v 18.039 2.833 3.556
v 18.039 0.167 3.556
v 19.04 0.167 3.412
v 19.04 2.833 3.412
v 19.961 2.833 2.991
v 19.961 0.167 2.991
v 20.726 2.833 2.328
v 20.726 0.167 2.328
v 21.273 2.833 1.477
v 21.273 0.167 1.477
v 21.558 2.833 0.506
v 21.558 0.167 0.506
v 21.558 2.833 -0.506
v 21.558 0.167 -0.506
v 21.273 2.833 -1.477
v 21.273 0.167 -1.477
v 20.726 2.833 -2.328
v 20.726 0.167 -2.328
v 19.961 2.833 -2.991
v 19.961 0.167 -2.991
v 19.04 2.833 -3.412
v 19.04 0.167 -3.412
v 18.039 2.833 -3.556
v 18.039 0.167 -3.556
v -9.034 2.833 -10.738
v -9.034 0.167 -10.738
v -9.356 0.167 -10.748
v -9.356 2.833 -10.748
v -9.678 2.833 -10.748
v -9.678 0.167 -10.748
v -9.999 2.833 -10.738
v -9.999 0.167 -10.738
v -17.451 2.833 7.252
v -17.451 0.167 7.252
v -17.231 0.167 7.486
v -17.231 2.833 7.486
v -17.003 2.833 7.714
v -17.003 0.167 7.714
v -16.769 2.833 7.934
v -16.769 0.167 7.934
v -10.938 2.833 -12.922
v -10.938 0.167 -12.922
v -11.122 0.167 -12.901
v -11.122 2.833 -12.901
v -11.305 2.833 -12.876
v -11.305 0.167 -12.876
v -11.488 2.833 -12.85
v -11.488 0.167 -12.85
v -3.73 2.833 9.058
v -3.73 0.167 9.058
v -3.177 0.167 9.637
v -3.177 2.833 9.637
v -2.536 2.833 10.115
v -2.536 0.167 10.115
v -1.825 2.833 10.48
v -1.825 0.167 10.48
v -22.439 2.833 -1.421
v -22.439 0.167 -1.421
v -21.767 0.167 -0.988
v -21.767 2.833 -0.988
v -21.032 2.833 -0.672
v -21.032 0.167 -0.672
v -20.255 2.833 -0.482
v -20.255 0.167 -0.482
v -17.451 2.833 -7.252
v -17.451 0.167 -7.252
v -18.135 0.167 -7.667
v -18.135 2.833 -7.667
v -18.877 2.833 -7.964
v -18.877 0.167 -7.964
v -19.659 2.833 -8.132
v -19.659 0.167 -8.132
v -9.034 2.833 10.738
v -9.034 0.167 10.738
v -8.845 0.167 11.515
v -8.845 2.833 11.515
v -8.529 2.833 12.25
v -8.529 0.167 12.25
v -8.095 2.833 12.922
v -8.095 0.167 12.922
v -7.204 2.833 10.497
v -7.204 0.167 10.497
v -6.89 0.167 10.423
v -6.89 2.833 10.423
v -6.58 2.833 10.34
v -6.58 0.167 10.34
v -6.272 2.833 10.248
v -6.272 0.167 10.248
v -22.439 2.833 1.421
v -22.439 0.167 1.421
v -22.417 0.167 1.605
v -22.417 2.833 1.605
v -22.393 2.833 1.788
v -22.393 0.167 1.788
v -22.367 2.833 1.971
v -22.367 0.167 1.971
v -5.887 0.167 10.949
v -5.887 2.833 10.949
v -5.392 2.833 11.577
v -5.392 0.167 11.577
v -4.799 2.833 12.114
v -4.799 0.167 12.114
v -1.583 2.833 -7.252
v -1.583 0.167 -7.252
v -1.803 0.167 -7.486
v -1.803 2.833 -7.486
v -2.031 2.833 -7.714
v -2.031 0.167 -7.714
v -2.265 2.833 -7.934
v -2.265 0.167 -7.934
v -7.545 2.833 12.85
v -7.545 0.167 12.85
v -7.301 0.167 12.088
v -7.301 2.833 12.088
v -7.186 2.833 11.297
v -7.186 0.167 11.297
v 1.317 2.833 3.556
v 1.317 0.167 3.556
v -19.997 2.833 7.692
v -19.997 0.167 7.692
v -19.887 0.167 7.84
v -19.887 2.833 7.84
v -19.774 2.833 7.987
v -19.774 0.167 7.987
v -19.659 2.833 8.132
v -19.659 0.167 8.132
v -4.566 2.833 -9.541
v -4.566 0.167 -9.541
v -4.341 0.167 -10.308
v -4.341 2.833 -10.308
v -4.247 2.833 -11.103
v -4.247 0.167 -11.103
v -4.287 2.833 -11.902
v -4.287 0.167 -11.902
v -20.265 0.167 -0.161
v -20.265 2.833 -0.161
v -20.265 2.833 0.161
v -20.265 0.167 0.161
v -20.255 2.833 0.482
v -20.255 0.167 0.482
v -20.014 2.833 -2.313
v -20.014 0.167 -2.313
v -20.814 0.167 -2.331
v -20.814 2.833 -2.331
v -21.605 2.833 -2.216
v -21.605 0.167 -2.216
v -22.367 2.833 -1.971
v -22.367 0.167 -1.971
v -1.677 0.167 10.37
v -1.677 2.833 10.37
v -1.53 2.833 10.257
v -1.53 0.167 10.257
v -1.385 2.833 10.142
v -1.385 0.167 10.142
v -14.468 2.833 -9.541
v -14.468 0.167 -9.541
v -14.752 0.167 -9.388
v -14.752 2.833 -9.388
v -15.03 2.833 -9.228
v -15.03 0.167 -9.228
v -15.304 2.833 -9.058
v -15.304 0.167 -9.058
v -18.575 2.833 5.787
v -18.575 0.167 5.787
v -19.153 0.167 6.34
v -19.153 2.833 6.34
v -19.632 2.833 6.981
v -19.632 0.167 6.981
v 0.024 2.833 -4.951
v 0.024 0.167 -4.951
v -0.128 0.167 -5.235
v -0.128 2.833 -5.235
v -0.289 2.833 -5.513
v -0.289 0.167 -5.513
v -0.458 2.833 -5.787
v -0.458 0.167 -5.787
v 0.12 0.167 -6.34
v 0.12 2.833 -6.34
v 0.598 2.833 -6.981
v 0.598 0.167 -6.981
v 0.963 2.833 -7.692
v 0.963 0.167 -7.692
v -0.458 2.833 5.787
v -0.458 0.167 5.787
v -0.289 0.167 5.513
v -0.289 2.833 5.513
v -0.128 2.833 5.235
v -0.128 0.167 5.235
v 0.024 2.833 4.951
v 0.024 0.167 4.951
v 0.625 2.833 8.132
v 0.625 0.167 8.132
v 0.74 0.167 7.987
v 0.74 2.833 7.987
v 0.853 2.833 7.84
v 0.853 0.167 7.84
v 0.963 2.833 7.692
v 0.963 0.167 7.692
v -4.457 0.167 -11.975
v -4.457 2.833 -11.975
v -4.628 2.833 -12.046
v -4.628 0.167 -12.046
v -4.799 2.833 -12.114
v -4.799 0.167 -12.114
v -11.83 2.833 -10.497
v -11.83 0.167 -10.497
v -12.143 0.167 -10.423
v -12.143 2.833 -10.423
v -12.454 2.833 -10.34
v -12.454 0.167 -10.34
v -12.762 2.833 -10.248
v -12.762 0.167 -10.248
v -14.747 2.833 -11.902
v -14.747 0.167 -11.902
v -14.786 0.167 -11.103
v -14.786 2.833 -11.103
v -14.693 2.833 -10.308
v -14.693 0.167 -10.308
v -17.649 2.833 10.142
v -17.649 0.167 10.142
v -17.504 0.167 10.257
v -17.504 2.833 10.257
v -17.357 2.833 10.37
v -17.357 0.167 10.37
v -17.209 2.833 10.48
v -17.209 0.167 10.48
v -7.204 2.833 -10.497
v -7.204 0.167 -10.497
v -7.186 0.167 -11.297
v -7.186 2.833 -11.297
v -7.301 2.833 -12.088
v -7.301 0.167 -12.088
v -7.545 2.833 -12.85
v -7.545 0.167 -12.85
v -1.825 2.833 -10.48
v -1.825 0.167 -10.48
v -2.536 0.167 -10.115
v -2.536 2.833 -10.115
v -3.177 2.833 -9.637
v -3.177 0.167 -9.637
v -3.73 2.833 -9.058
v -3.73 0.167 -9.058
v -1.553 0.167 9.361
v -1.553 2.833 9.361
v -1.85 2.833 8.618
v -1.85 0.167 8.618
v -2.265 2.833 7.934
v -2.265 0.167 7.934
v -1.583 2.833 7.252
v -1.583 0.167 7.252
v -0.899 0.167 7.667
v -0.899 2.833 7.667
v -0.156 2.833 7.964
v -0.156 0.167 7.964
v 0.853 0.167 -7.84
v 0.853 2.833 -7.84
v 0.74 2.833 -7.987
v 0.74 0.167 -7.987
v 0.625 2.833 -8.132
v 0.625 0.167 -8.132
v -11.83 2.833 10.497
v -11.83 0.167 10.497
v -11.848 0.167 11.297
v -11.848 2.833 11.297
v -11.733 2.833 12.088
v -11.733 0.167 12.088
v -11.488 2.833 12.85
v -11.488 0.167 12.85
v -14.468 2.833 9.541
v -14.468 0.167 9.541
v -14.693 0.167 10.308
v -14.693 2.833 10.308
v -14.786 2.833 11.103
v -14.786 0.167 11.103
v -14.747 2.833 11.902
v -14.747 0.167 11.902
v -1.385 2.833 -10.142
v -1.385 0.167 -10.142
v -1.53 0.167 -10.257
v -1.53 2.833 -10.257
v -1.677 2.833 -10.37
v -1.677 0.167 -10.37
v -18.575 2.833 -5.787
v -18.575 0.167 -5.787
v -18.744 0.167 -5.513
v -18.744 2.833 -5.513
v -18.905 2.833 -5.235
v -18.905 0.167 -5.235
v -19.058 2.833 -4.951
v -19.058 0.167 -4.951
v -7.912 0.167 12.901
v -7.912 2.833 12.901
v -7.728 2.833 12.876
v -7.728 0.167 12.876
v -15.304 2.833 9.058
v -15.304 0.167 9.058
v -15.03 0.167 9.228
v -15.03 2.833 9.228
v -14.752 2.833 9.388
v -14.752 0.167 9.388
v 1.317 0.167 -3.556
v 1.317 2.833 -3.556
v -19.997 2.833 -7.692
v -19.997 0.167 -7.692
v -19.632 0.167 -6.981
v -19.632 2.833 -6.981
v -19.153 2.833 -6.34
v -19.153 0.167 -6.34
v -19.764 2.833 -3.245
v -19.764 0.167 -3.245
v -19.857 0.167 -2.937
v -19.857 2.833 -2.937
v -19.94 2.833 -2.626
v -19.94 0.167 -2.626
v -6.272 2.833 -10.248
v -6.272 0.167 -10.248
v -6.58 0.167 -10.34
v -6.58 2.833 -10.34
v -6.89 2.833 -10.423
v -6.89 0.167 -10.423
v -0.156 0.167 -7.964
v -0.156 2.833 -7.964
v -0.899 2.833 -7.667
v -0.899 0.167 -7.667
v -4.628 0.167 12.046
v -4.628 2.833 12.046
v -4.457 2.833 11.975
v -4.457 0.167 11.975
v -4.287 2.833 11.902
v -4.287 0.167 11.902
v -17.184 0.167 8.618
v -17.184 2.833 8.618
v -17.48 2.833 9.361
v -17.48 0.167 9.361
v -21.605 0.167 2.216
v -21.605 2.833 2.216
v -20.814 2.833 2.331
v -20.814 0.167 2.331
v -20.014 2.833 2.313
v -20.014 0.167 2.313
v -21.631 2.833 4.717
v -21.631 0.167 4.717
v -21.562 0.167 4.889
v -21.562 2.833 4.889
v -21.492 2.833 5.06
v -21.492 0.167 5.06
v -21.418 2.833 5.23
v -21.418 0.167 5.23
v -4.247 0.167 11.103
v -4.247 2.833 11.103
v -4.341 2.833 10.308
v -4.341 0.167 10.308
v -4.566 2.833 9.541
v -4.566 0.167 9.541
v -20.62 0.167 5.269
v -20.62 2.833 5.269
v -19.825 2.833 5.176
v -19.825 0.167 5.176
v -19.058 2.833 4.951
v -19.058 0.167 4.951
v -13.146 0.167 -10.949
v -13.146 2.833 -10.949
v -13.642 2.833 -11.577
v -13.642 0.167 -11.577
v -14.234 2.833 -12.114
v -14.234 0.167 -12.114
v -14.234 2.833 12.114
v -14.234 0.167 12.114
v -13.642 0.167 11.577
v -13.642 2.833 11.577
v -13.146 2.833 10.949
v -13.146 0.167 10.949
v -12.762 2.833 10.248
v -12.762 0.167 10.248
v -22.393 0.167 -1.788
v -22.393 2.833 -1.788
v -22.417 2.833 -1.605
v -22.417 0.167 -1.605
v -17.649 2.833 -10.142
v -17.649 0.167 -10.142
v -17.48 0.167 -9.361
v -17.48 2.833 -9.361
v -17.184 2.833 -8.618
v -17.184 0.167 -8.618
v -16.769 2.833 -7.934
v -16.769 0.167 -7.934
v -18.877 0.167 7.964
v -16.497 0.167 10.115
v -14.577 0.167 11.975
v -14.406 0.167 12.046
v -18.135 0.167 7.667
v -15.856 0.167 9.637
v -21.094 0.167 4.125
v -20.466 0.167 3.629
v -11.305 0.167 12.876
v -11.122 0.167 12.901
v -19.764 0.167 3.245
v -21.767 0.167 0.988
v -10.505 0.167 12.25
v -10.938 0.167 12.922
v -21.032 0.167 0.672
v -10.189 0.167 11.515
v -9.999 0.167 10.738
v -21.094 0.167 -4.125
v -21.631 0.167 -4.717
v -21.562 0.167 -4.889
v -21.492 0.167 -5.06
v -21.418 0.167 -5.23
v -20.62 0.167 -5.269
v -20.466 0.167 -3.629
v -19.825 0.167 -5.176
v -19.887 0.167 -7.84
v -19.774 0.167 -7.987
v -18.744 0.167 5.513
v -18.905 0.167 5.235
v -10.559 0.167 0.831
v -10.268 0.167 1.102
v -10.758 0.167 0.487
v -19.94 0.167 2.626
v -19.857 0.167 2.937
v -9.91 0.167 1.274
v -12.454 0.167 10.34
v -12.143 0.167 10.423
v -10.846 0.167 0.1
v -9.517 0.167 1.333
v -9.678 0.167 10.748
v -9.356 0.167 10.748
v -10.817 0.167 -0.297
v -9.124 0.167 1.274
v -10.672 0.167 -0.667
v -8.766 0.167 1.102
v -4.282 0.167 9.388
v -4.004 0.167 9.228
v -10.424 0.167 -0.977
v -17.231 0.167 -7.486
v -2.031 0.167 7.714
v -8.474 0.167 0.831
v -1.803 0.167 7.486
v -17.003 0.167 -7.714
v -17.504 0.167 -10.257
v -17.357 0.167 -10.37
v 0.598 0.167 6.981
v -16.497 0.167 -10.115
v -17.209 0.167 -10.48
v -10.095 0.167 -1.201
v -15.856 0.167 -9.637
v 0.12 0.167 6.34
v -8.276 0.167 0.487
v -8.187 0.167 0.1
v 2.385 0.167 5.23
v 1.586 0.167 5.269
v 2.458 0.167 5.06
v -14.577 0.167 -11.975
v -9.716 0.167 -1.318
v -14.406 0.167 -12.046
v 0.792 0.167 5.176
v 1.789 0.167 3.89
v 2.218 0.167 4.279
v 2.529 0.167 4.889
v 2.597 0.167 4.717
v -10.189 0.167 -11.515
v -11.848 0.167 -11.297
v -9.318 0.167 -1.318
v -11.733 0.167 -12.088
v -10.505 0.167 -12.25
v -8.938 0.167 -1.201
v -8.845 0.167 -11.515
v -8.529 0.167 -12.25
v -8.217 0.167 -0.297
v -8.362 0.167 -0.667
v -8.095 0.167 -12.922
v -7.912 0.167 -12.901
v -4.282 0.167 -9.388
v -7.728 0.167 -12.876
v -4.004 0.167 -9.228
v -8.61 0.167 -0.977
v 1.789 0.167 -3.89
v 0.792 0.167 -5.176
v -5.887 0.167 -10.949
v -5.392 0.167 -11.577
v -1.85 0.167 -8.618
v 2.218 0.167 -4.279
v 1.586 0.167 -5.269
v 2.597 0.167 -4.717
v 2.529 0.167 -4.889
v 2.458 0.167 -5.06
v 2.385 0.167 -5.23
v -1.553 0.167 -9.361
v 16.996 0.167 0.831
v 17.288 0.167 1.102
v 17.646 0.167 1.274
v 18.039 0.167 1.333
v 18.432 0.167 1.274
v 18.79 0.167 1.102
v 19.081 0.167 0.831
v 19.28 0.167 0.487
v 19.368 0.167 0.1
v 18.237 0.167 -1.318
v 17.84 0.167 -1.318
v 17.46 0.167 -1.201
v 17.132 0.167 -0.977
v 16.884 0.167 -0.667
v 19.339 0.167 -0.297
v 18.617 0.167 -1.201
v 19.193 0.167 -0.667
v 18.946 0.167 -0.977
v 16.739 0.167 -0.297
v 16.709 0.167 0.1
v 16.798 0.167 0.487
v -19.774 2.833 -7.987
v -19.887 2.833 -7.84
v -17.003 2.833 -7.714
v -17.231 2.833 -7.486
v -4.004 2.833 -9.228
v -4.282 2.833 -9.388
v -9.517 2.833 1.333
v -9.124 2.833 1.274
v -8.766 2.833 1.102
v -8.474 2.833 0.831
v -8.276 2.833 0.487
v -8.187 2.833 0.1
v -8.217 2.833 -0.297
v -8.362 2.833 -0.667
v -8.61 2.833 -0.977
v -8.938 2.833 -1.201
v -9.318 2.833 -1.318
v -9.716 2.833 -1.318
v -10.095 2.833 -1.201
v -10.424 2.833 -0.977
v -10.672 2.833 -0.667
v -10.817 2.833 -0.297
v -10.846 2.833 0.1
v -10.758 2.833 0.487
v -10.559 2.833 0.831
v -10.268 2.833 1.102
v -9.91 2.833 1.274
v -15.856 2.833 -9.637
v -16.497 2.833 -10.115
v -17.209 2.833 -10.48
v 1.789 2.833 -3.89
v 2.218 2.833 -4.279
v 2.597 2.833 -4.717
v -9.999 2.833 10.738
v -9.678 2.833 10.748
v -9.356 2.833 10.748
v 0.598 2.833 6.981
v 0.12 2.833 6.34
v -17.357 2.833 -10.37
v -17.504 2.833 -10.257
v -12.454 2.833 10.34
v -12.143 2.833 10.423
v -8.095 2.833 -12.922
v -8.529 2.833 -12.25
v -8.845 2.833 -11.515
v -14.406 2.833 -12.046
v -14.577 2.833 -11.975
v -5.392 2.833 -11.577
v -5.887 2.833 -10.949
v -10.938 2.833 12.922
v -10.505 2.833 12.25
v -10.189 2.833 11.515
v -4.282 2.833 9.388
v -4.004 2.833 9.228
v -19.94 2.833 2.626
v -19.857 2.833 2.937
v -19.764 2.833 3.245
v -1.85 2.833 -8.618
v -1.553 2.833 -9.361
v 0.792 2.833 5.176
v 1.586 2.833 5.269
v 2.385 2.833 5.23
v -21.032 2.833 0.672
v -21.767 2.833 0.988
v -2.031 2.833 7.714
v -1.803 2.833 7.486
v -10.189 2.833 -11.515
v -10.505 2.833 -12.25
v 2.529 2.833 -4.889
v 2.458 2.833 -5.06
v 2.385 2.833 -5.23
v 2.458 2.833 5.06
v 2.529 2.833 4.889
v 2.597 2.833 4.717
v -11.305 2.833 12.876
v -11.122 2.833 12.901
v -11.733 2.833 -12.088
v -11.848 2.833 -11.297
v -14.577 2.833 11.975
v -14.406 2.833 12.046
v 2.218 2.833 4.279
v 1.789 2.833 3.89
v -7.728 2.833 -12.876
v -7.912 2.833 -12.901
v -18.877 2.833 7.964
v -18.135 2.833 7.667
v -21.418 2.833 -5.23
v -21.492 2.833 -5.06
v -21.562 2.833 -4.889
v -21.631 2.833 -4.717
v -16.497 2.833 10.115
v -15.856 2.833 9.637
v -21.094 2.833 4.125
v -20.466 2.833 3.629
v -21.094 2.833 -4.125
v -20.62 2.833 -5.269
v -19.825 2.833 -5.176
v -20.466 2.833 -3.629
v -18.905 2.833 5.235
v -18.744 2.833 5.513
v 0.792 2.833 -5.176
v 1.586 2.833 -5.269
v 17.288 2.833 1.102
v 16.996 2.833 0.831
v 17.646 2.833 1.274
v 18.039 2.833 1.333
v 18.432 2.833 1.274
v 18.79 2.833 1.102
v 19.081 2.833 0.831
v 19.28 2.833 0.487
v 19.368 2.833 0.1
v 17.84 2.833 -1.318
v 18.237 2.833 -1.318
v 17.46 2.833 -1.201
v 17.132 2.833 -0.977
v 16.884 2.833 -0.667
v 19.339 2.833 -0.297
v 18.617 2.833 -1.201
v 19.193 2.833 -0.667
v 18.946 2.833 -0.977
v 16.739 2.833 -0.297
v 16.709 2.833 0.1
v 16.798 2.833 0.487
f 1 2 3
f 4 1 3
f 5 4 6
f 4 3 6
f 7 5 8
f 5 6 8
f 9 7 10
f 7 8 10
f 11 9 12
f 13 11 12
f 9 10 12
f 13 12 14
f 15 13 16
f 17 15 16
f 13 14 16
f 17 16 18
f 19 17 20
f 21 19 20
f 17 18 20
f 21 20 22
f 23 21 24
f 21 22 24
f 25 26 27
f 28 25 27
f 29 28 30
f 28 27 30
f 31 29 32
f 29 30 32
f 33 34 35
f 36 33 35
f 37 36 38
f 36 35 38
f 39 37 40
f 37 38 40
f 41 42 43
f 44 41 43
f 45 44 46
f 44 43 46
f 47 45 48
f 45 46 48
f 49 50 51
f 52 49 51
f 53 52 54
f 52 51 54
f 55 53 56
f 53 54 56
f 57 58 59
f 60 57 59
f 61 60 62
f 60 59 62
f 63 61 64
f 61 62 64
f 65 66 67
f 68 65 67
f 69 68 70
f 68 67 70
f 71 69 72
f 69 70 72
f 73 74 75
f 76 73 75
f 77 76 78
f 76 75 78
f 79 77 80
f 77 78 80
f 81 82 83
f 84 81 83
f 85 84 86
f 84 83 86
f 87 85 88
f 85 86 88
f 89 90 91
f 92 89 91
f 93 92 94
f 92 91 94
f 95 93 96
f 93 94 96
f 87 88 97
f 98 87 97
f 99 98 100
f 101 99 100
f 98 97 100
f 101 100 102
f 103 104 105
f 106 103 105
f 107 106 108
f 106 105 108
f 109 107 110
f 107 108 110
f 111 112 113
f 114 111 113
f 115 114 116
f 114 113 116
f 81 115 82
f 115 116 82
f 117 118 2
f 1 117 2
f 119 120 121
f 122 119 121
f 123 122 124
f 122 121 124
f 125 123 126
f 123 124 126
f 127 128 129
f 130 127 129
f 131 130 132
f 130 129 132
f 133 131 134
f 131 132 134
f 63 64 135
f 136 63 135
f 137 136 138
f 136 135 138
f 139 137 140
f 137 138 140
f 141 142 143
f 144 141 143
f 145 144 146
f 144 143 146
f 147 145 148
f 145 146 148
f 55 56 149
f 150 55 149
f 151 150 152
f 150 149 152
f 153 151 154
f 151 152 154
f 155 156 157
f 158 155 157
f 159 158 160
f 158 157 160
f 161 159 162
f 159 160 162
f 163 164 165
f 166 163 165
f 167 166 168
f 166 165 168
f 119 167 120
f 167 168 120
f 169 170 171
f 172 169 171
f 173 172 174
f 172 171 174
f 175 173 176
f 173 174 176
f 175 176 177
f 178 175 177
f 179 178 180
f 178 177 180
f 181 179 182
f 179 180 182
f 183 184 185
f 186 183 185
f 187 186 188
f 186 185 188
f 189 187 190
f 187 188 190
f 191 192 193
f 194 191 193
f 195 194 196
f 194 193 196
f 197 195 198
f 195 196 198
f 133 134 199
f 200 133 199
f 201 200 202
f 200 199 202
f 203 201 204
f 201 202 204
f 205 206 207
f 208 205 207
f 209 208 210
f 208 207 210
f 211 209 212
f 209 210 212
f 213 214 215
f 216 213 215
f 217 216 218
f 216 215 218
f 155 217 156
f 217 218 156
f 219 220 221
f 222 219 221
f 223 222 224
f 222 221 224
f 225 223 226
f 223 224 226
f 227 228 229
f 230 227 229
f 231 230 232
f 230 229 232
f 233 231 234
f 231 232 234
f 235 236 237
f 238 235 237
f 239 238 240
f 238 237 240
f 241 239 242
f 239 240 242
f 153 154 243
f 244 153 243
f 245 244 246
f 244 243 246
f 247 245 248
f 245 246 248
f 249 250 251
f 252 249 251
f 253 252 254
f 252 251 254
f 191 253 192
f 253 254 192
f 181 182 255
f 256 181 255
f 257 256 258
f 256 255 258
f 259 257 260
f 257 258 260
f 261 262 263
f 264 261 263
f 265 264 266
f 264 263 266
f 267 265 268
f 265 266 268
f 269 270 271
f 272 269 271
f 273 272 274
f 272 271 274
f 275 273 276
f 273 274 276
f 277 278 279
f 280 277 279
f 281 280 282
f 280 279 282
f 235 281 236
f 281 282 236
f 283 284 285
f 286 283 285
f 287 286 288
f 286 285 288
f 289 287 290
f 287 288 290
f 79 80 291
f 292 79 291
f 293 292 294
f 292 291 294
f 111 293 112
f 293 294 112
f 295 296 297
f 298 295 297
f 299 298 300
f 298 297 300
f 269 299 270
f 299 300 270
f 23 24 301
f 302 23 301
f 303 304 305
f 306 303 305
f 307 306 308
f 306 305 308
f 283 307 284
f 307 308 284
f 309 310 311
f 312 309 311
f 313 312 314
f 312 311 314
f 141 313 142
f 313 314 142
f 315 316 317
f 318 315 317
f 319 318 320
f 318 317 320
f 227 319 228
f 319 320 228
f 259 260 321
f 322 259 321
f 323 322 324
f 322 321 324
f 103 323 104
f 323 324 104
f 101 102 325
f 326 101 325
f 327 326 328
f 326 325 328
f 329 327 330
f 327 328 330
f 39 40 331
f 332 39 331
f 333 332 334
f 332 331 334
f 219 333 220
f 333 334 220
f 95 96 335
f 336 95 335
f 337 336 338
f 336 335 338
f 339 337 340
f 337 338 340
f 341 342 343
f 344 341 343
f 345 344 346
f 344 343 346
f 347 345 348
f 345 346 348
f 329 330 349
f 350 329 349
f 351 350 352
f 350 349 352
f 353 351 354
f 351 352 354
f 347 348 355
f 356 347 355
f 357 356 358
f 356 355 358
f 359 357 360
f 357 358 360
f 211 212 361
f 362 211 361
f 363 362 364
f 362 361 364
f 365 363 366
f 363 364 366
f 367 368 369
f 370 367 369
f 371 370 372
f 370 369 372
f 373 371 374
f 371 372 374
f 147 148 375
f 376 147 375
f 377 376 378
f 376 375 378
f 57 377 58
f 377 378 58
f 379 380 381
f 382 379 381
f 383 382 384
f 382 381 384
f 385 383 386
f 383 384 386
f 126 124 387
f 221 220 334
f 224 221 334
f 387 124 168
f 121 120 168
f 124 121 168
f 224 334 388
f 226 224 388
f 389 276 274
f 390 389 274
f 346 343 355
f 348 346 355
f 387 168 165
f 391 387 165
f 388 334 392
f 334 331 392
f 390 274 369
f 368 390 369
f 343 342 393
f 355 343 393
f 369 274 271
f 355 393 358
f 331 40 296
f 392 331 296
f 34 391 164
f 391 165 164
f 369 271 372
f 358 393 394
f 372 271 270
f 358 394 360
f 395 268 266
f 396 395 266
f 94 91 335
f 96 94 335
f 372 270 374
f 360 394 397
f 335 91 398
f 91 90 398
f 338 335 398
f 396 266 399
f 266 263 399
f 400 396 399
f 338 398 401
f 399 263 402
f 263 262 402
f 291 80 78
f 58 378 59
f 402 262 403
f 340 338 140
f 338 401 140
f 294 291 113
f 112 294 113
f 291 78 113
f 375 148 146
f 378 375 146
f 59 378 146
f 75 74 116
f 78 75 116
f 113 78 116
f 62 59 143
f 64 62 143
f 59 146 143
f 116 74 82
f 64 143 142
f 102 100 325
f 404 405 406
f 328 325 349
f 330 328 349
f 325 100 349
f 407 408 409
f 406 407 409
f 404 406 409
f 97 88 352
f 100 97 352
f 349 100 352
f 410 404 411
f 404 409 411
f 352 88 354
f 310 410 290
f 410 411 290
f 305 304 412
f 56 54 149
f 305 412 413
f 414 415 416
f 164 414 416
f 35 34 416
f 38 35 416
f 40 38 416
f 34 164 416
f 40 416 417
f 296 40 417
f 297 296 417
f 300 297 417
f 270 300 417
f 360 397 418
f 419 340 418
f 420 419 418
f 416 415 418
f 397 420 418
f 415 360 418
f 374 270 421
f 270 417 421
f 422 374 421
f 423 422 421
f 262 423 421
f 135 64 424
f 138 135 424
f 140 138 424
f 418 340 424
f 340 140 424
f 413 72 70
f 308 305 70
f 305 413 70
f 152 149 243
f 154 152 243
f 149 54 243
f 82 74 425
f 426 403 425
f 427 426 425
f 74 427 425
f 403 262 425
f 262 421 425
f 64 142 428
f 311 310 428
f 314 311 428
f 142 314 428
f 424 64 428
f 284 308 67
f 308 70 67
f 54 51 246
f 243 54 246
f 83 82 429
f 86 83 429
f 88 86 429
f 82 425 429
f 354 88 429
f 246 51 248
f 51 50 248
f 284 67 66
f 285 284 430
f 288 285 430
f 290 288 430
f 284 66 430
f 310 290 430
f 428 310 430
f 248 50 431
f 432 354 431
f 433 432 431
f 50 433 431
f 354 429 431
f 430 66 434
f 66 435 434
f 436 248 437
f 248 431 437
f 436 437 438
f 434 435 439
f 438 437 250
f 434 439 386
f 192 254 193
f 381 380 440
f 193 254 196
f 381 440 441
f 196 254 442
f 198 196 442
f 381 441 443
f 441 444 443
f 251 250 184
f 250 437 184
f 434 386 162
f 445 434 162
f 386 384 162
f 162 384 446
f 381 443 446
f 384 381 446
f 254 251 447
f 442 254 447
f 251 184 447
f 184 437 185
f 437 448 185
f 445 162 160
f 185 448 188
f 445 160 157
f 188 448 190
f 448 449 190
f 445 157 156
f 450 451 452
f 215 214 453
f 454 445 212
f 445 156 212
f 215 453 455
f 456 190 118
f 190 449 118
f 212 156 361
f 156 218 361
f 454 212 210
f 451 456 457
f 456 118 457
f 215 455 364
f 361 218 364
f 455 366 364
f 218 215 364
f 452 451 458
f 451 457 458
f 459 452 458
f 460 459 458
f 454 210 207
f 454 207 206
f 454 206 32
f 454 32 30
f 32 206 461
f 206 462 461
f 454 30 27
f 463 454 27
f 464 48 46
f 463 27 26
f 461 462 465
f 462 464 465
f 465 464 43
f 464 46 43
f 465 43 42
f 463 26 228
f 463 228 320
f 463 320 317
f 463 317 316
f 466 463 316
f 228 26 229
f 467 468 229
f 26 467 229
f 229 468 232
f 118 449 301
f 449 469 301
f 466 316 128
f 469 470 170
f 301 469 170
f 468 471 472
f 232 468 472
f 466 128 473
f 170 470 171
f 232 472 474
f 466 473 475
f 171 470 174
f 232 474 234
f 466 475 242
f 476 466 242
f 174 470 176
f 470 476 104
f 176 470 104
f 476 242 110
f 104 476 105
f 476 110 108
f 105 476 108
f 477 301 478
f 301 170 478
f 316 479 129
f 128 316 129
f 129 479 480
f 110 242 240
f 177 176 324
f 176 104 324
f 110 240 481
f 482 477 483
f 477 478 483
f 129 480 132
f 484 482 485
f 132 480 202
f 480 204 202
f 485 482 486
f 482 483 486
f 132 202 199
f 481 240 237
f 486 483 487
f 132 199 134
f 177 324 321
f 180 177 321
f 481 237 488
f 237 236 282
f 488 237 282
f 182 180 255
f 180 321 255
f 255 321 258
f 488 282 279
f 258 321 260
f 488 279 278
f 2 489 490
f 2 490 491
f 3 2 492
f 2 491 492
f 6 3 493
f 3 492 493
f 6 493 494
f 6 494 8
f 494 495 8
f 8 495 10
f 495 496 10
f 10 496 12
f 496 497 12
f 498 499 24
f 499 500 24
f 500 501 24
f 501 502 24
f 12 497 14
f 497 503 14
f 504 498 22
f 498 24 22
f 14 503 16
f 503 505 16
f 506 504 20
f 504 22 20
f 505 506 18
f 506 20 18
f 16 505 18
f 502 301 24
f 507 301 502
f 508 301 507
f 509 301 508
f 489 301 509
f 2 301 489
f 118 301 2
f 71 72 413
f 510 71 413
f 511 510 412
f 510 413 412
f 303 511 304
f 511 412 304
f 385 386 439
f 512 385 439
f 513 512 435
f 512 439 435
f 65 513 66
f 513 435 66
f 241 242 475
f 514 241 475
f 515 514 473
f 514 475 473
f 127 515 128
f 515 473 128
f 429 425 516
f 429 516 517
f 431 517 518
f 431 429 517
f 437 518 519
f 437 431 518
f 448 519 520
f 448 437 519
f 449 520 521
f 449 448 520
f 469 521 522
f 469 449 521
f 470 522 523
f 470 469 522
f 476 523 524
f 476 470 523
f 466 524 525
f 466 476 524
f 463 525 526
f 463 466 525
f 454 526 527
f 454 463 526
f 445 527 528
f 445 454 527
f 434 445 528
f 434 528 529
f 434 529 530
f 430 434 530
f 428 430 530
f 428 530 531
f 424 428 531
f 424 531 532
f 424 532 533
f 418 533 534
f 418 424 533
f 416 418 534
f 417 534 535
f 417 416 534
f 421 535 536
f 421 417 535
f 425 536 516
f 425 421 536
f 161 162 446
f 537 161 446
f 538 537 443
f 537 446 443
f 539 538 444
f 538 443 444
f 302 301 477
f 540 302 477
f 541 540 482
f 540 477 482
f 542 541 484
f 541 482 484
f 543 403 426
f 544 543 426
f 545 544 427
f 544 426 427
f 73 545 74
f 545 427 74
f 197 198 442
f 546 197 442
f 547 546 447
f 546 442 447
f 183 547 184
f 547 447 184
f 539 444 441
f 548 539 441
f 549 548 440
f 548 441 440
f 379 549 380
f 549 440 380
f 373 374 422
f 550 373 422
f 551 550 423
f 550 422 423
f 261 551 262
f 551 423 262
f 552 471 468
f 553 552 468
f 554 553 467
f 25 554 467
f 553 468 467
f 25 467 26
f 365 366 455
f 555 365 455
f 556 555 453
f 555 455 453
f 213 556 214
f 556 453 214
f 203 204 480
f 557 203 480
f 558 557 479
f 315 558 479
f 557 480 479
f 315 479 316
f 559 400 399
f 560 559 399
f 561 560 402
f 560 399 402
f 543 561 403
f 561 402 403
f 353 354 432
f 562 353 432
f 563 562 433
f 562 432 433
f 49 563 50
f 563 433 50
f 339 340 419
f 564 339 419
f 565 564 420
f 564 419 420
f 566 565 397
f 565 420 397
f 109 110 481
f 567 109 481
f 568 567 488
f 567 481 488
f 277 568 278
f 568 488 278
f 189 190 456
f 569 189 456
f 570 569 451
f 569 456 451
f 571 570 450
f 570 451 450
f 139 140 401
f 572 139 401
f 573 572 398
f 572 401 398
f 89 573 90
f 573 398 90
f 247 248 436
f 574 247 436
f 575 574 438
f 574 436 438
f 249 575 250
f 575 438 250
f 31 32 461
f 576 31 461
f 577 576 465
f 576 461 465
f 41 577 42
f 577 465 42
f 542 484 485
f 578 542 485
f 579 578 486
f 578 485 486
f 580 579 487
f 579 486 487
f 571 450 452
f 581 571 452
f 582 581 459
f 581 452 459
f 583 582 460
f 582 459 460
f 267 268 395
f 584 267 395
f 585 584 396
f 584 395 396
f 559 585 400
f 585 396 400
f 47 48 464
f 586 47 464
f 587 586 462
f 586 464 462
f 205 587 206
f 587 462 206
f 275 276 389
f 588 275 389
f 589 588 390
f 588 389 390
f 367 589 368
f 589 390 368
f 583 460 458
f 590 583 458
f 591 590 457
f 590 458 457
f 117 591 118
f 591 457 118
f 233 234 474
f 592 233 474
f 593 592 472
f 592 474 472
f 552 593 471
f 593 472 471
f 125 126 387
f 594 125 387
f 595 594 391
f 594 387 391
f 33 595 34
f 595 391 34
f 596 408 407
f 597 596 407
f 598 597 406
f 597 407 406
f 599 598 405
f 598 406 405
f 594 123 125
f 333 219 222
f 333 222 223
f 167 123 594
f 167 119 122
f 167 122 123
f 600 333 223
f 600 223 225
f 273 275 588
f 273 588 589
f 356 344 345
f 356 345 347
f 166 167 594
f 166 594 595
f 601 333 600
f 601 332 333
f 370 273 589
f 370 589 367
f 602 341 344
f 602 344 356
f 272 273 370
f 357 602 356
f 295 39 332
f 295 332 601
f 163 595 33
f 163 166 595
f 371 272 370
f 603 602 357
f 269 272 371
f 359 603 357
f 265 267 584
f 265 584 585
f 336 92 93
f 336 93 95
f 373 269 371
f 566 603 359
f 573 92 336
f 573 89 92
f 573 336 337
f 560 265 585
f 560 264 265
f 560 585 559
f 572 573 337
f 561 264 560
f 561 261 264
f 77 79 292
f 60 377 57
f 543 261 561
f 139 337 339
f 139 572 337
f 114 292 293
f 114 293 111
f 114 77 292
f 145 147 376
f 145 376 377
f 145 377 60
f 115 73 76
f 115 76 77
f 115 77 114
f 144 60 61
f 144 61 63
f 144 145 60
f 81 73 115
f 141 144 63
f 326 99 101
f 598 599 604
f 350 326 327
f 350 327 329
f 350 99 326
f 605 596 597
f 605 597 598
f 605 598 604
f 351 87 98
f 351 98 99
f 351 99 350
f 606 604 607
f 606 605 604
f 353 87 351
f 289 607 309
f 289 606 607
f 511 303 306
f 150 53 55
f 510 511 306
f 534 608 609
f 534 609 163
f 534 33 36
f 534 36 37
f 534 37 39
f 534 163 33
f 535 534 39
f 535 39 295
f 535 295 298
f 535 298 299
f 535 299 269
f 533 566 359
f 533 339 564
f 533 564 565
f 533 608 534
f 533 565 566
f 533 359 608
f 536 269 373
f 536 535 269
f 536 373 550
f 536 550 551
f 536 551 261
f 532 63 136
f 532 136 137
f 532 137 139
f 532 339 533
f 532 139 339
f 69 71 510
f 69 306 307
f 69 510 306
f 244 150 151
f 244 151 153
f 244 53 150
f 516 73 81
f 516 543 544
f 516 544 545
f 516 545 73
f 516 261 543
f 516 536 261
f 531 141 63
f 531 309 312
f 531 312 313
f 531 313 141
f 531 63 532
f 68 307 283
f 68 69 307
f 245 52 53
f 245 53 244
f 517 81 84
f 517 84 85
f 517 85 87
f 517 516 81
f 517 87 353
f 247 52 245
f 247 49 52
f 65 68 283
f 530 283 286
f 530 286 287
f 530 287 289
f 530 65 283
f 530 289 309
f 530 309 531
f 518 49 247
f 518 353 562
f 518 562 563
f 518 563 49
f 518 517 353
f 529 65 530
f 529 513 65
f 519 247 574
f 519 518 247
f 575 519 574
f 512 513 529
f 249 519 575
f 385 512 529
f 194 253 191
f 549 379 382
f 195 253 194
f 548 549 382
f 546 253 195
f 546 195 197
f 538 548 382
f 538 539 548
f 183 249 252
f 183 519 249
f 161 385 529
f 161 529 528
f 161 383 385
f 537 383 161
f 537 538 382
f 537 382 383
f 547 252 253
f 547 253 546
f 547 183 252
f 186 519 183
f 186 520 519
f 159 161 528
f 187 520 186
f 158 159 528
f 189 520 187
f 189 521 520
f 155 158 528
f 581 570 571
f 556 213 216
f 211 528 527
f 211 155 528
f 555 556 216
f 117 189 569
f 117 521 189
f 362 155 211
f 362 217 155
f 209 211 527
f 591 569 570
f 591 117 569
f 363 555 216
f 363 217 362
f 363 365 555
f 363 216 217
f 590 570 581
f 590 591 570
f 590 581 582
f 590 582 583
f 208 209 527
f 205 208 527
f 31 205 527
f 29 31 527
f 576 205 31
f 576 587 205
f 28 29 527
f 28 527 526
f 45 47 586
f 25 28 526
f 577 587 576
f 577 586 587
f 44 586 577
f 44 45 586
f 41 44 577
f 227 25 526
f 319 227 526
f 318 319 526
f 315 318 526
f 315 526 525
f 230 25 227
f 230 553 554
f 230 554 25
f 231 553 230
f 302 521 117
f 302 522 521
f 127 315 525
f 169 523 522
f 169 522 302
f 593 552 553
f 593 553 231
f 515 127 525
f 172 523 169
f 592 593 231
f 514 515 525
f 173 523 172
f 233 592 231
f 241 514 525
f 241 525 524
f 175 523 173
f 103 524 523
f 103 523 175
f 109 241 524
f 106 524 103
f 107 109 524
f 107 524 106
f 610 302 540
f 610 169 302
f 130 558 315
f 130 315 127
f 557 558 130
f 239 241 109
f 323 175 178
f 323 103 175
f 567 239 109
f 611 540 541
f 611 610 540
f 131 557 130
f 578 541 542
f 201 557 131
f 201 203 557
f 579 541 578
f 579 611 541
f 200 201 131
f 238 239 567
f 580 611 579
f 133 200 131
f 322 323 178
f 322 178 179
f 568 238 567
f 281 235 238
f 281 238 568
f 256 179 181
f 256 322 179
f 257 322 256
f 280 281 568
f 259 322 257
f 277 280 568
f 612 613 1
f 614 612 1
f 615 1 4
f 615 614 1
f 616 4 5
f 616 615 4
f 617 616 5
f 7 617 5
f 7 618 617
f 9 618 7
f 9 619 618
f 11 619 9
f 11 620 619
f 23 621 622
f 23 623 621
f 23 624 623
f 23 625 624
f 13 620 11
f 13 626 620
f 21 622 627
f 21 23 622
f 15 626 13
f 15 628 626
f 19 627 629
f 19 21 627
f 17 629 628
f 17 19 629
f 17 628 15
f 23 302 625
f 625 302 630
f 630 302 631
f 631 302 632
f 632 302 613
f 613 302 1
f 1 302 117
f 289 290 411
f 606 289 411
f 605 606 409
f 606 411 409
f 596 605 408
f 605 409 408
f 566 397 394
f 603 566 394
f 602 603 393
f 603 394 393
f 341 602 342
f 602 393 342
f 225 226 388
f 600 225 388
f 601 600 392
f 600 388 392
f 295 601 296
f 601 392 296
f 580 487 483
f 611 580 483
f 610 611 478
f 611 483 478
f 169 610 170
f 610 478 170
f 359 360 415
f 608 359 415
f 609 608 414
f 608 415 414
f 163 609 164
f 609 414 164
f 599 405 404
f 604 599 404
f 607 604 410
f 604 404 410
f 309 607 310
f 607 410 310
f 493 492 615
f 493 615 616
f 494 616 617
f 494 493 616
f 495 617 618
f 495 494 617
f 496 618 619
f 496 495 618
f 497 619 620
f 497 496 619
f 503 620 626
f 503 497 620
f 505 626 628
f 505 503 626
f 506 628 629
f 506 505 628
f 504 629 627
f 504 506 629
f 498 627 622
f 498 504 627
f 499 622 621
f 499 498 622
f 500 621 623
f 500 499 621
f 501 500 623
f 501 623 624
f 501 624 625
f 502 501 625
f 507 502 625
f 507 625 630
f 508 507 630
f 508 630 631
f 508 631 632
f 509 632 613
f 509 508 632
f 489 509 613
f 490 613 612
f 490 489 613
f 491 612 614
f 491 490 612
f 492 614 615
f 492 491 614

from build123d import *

# Parameters (mm, degrees)
SKETCH1_R           = 1.5
BOSS_EXTRUDE1_DEPTH = 3
SCALE1_SCALE        = 0.888888889


with BuildPart() as part:
    # Sketch1 → Boss-Extrude1 (new body)
    with BuildSketch(Plane(origin=(0, 0, 0), x_dir=(1, 0, 0), z_dir=(0, 1, 0))):
        with BuildLine():
            Line((20.893657446, 4), (2.081641936, 4))
            ThreePointArc((2.081641936, 4), (2.861028333, 4.588201733), (3.521749436, 5.30713988))
            ThreePointArc((3.521749436, 5.30713988), (3.405395609, 5.596745198), (3.282888305, 5.883801663))
            ThreePointArc((3.282888305, 5.883801663), (1.93527598, 5.894040025), (0.627094961, 5.57027124))
            ThreePointArc((0.627094961, 5.57027124), (0.366286148, 6.046375), (0.084372603, 6.510293938))
            ThreePointArc((0.084372603, 6.510293938), (1.018855105, 7.48132754), (1.683794586, 8.65351323))
            ThreePointArc((1.683794586, 8.65351323), (1.496450048, 8.903135899), (1.303821399, 9.148703928))
            ThreePointArc((1.303821399, 9.148703928), (-0.000522033, 8.809805691), (-1.180330337, 8.158486898))
            ThreePointArc((-1.180330337, 8.158486898), (-1.555477026, 8.550865528), (-1.947855656, 8.926012217))
            ThreePointArc((-1.947855656, 8.926012217), (-1.296536862, 10.105820521), (-0.957638625, 11.410163953))
            ThreePointArc((-0.957638625, 11.410163953), (-1.203206655, 11.602792602), (-1.452829324, 11.79013714))
            ThreePointArc((-1.452829324, 11.79013714), (-2.625015014, 11.125197659), (-3.596048616, 10.190715157))
            ThreePointArc((-3.596048616, 10.190715157), (-4.059967554, 10.472628702), (-4.536071314, 10.733437515))
            ThreePointArc((-4.536071314, 10.733437515), (-4.212302529, 12.041618533), (-4.222540891, 13.389230859))
            ThreePointArc((-4.222540891, 13.389230859), (-4.509597355, 13.511738163), (-4.799202674, 13.62809199))
            ThreePointArc((-4.799202674, 13.62809199), (-5.759348103, 12.682425791), (-6.455432668, 11.528463019))
            ThreePointArc((-6.455432668, 11.528463019), (-6.976508546, 11.680699536), (-7.503891752, 11.809396783))
            ThreePointArc((-7.503891752, 11.809396783), (-7.529737283, 13.156800143), (-7.888414517, 14.455843809))
            ThreePointArc((-7.888414517, 14.455843809), (-8.197396993, 14.499881098), (-8.507248835, 14.537314892))
            ThreePointArc((-8.507248835, 14.537314892), (-9.18992168, 13.375367565), (-9.563620196, 12.080565177))
            ThreePointArc((-9.563620196, 12.080565177), (-10.106342554, 12.09275), (-10.649064912, 12.080565177))
            ThreePointArc((-10.649064912, 12.080565177), (-11.022763428, 13.375367565), (-11.705436272, 14.537314892))
            ThreePointArc((-11.705436272, 14.537314892), (-12.015288115, 14.499881098), (-12.324270591, 14.455843809))
            ThreePointArc((-12.324270591, 14.455843809), (-12.682947825, 13.156800143), (-12.708793355, 11.809396783))
            ThreePointArc((-12.708793355, 11.809396783), (-13.236176561, 11.680699536), (-13.757252439, 11.528463019))
            ThreePointArc((-13.757252439, 11.528463019), (-14.453337005, 12.682425791), (-15.413482434, 13.62809199))
            ThreePointArc((-15.413482434, 13.62809199), (-15.703087752, 13.511738163), (-15.990144217, 13.389230859))
            ThreePointArc((-15.990144217, 13.389230859), (-16.000382579, 12.041618533), (-15.676613793, 10.733437515))
            ThreePointArc((-15.676613793, 10.733437515), (-16.152717554, 10.472628702), (-16.616636492, 10.190715157))
            ThreePointArc((-16.616636492, 10.190715157), (-17.587670094, 11.125197659), (-18.759855783, 11.79013714))
            ThreePointArc((-18.759855783, 11.79013714), (-19.009478453, 11.602792602), (-19.255046482, 11.410163953))
            ThreePointArc((-19.255046482, 11.410163953), (-18.916148245, 10.105820521), (-18.264829452, 8.926012217))
            ThreePointArc((-18.264829452, 8.926012217), (-18.657208082, 8.550865528), (-19.032354771, 8.158486898))
            ThreePointArc((-19.032354771, 8.158486898), (-20.212163074, 8.809805691), (-21.516506507, 9.148703928))
            ThreePointArc((-21.516506507, 9.148703928), (-21.709135156, 8.903135899), (-21.896479694, 8.65351323))
            ThreePointArc((-21.896479694, 8.65351323), (-21.231540213, 7.48132754), (-20.297057711, 6.510293938))
            ThreePointArc((-20.297057711, 6.510293938), (-20.578971255, 6.046375), (-20.839780068, 5.57027124))
            ThreePointArc((-20.839780068, 5.57027124), (-22.147961087, 5.894040025), (-23.495573413, 5.883801663))
            ThreePointArc((-23.495573413, 5.883801663), (-23.618080717, 5.596745198), (-23.734434544, 5.30713988))
            ThreePointArc((-23.734434544, 5.30713988), (-22.788768345, 4.346994451), (-21.634805572, 3.650909885))
            ThreePointArc((-21.634805572, 3.650909885), (-21.78704209, 3.129834008), (-21.915739337, 2.602450802))
            ThreePointArc((-21.915739337, 2.602450802), (-23.263142697, 2.576605271), (-24.562186363, 2.217928037))
            ThreePointArc((-24.562186363, 2.217928037), (-24.606223651, 1.908945561), (-24.643657446, 1.599093719))
            ThreePointArc((-24.643657446, 1.599093719), (-23.481710119, 0.916420874), (-22.186907731, 0.542722358))
            ThreePointArc((-22.186907731, 0.542722358), (-22.199092554, 0), (-22.186907731, -0.542722358))
            ThreePointArc((-22.186907731, -0.542722358), (-23.481710119, -0.916420874), (-24.643657446, -1.599093719))
            ThreePointArc((-24.643657446, -1.599093719), (-24.606223651, -1.908945561), (-24.562186363, -2.217928037))
            ThreePointArc((-24.562186363, -2.217928037), (-23.263142697, -2.576605271), (-21.915739337, -2.602450802))
            ThreePointArc((-21.915739337, -2.602450802), (-21.78704209, -3.129834008), (-21.634805572, -3.650909885))
            ThreePointArc((-21.634805572, -3.650909885), (-22.788768345, -4.346994451), (-23.734434544, -5.30713988))
            ThreePointArc((-23.734434544, -5.30713988), (-23.618080717, -5.596745198), (-23.495573413, -5.883801663))
            ThreePointArc((-23.495573413, -5.883801663), (-22.147961087, -5.894040025), (-20.839780068, -5.57027124))
            ThreePointArc((-20.839780068, -5.57027124), (-20.578971255, -6.046375), (-20.297057711, -6.510293938))
            ThreePointArc((-20.297057711, -6.510293938), (-21.231540213, -7.48132754), (-21.896479694, -8.65351323))
            ThreePointArc((-21.896479694, -8.65351323), (-21.709135156, -8.903135899), (-21.516506507, -9.148703928))
            ThreePointArc((-21.516506507, -9.148703928), (-20.212163074, -8.809805691), (-19.032354771, -8.158486898))
            ThreePointArc((-19.032354771, -8.158486898), (-18.657208082, -8.550865528), (-18.264829452, -8.926012217))
            ThreePointArc((-18.264829452, -8.926012217), (-18.916148245, -10.105820521), (-19.255046482, -11.410163953))
            ThreePointArc((-19.255046482, -11.410163953), (-19.009478453, -11.602792602), (-18.759855783, -11.79013714))
            ThreePointArc((-18.759855783, -11.79013714), (-17.587670094, -11.125197659), (-16.616636492, -10.190715157))
            ThreePointArc((-16.616636492, -10.190715157), (-16.152717554, -10.472628702), (-15.676613793, -10.733437515))
            ThreePointArc((-15.676613793, -10.733437515), (-16.000382579, -12.041618533), (-15.990144217, -13.389230859))
            ThreePointArc((-15.990144217, -13.389230859), (-15.703087752, -13.511738163), (-15.413482434, -13.62809199))
            ThreePointArc((-15.413482434, -13.62809199), (-14.453337005, -12.682425791), (-13.757252439, -11.528463019))
            ThreePointArc((-13.757252439, -11.528463019), (-13.236176561, -11.680699536), (-12.708793355, -11.809396783))
            ThreePointArc((-12.708793355, -11.809396783), (-12.682947825, -13.156800143), (-12.324270591, -14.455843809))
            ThreePointArc((-12.324270591, -14.455843809), (-12.015288115, -14.499881098), (-11.705436272, -14.537314892))
            ThreePointArc((-11.705436272, -14.537314892), (-11.022763428, -13.375367565), (-10.649064912, -12.080565177))
            ThreePointArc((-10.649064912, -12.080565177), (-10.106342554, -12.09275), (-9.563620196, -12.080565177))
            ThreePointArc((-9.563620196, -12.080565177), (-9.18992168, -13.375367565), (-8.507248835, -14.537314892))
            ThreePointArc((-8.507248835, -14.537314892), (-8.197396993, -14.499881098), (-7.888414517, -14.455843809))
            ThreePointArc((-7.888414517, -14.455843809), (-7.529737283, -13.156800143), (-7.503891752, -11.809396783))
            ThreePointArc((-7.503891752, -11.809396783), (-6.976508546, -11.680699536), (-6.455432668, -11.528463019))
            ThreePointArc((-6.455432668, -11.528463019), (-5.759348103, -12.682425791), (-4.799202674, -13.62809199))
            ThreePointArc((-4.799202674, -13.62809199), (-4.509597355, -13.511738163), (-4.222540891, -13.389230859))
            ThreePointArc((-4.222540891, -13.389230859), (-4.212302529, -12.041618533), (-4.536071314, -10.733437515))
            ThreePointArc((-4.536071314, -10.733437515), (-4.059967554, -10.472628702), (-3.596048616, -10.190715157))
            ThreePointArc((-3.596048616, -10.190715157), (-2.625015014, -11.125197659), (-1.452829324, -11.79013714))
            ThreePointArc((-1.452829324, -11.79013714), (-1.203206655, -11.602792602), (-0.957638625, -11.410163953))
            ThreePointArc((-0.957638625, -11.410163953), (-1.296536862, -10.105820521), (-1.947855656, -8.926012217))
            ThreePointArc((-1.947855656, -8.926012217), (-1.555477026, -8.550865528), (-1.180330337, -8.158486898))
            ThreePointArc((-1.180330337, -8.158486898), (-0.000522033, -8.809805691), (1.303821399, -9.148703928))
            ThreePointArc((1.303821399, -9.148703928), (1.496450048, -8.903135899), (1.683794586, -8.65351323))
            ThreePointArc((1.683794586, -8.65351323), (1.018855105, -7.48132754), (0.084372603, -6.510293938))
            ThreePointArc((0.084372603, -6.510293938), (0.366286148, -6.046375), (0.627094961, -5.57027124))
            ThreePointArc((0.627094961, -5.57027124), (1.93527598, -5.894040025), (3.282888305, -5.883801663))
            ThreePointArc((3.282888305, -5.883801663), (3.405395609, -5.596745198), (3.521749436, -5.30713988))
            ThreePointArc((3.521749436, -5.30713988), (2.861028333, -4.588201733), (2.081641936, -4))
            Line((2.081641936, -4), (20.893657446, -4))
            ThreePointArc((20.893657446, -4), (24.893657446, 0), (20.893657446, 4))
        make_face()
        with Locations(Location((-10.106342554, 0, 0), (0, 0, 270))):
            Circle(SKETCH1_R, mode=Mode.SUBTRACT)
        with Locations(Location((20.893657446, 0, 0), (0, 0, 270))):
            Circle(SKETCH1_R, mode=Mode.SUBTRACT)
    extrude(amount=BOSS_EXTRUDE1_DEPTH)


with BuildPart() as part_1:
    # Scale1: scaled about (-4.801213178, 1.5, 0)
    add(part.part.scale(SCALE1_SCALE).moved(Location((-0.533468131, 0.166666667, 0))))


solid = part_1.part
